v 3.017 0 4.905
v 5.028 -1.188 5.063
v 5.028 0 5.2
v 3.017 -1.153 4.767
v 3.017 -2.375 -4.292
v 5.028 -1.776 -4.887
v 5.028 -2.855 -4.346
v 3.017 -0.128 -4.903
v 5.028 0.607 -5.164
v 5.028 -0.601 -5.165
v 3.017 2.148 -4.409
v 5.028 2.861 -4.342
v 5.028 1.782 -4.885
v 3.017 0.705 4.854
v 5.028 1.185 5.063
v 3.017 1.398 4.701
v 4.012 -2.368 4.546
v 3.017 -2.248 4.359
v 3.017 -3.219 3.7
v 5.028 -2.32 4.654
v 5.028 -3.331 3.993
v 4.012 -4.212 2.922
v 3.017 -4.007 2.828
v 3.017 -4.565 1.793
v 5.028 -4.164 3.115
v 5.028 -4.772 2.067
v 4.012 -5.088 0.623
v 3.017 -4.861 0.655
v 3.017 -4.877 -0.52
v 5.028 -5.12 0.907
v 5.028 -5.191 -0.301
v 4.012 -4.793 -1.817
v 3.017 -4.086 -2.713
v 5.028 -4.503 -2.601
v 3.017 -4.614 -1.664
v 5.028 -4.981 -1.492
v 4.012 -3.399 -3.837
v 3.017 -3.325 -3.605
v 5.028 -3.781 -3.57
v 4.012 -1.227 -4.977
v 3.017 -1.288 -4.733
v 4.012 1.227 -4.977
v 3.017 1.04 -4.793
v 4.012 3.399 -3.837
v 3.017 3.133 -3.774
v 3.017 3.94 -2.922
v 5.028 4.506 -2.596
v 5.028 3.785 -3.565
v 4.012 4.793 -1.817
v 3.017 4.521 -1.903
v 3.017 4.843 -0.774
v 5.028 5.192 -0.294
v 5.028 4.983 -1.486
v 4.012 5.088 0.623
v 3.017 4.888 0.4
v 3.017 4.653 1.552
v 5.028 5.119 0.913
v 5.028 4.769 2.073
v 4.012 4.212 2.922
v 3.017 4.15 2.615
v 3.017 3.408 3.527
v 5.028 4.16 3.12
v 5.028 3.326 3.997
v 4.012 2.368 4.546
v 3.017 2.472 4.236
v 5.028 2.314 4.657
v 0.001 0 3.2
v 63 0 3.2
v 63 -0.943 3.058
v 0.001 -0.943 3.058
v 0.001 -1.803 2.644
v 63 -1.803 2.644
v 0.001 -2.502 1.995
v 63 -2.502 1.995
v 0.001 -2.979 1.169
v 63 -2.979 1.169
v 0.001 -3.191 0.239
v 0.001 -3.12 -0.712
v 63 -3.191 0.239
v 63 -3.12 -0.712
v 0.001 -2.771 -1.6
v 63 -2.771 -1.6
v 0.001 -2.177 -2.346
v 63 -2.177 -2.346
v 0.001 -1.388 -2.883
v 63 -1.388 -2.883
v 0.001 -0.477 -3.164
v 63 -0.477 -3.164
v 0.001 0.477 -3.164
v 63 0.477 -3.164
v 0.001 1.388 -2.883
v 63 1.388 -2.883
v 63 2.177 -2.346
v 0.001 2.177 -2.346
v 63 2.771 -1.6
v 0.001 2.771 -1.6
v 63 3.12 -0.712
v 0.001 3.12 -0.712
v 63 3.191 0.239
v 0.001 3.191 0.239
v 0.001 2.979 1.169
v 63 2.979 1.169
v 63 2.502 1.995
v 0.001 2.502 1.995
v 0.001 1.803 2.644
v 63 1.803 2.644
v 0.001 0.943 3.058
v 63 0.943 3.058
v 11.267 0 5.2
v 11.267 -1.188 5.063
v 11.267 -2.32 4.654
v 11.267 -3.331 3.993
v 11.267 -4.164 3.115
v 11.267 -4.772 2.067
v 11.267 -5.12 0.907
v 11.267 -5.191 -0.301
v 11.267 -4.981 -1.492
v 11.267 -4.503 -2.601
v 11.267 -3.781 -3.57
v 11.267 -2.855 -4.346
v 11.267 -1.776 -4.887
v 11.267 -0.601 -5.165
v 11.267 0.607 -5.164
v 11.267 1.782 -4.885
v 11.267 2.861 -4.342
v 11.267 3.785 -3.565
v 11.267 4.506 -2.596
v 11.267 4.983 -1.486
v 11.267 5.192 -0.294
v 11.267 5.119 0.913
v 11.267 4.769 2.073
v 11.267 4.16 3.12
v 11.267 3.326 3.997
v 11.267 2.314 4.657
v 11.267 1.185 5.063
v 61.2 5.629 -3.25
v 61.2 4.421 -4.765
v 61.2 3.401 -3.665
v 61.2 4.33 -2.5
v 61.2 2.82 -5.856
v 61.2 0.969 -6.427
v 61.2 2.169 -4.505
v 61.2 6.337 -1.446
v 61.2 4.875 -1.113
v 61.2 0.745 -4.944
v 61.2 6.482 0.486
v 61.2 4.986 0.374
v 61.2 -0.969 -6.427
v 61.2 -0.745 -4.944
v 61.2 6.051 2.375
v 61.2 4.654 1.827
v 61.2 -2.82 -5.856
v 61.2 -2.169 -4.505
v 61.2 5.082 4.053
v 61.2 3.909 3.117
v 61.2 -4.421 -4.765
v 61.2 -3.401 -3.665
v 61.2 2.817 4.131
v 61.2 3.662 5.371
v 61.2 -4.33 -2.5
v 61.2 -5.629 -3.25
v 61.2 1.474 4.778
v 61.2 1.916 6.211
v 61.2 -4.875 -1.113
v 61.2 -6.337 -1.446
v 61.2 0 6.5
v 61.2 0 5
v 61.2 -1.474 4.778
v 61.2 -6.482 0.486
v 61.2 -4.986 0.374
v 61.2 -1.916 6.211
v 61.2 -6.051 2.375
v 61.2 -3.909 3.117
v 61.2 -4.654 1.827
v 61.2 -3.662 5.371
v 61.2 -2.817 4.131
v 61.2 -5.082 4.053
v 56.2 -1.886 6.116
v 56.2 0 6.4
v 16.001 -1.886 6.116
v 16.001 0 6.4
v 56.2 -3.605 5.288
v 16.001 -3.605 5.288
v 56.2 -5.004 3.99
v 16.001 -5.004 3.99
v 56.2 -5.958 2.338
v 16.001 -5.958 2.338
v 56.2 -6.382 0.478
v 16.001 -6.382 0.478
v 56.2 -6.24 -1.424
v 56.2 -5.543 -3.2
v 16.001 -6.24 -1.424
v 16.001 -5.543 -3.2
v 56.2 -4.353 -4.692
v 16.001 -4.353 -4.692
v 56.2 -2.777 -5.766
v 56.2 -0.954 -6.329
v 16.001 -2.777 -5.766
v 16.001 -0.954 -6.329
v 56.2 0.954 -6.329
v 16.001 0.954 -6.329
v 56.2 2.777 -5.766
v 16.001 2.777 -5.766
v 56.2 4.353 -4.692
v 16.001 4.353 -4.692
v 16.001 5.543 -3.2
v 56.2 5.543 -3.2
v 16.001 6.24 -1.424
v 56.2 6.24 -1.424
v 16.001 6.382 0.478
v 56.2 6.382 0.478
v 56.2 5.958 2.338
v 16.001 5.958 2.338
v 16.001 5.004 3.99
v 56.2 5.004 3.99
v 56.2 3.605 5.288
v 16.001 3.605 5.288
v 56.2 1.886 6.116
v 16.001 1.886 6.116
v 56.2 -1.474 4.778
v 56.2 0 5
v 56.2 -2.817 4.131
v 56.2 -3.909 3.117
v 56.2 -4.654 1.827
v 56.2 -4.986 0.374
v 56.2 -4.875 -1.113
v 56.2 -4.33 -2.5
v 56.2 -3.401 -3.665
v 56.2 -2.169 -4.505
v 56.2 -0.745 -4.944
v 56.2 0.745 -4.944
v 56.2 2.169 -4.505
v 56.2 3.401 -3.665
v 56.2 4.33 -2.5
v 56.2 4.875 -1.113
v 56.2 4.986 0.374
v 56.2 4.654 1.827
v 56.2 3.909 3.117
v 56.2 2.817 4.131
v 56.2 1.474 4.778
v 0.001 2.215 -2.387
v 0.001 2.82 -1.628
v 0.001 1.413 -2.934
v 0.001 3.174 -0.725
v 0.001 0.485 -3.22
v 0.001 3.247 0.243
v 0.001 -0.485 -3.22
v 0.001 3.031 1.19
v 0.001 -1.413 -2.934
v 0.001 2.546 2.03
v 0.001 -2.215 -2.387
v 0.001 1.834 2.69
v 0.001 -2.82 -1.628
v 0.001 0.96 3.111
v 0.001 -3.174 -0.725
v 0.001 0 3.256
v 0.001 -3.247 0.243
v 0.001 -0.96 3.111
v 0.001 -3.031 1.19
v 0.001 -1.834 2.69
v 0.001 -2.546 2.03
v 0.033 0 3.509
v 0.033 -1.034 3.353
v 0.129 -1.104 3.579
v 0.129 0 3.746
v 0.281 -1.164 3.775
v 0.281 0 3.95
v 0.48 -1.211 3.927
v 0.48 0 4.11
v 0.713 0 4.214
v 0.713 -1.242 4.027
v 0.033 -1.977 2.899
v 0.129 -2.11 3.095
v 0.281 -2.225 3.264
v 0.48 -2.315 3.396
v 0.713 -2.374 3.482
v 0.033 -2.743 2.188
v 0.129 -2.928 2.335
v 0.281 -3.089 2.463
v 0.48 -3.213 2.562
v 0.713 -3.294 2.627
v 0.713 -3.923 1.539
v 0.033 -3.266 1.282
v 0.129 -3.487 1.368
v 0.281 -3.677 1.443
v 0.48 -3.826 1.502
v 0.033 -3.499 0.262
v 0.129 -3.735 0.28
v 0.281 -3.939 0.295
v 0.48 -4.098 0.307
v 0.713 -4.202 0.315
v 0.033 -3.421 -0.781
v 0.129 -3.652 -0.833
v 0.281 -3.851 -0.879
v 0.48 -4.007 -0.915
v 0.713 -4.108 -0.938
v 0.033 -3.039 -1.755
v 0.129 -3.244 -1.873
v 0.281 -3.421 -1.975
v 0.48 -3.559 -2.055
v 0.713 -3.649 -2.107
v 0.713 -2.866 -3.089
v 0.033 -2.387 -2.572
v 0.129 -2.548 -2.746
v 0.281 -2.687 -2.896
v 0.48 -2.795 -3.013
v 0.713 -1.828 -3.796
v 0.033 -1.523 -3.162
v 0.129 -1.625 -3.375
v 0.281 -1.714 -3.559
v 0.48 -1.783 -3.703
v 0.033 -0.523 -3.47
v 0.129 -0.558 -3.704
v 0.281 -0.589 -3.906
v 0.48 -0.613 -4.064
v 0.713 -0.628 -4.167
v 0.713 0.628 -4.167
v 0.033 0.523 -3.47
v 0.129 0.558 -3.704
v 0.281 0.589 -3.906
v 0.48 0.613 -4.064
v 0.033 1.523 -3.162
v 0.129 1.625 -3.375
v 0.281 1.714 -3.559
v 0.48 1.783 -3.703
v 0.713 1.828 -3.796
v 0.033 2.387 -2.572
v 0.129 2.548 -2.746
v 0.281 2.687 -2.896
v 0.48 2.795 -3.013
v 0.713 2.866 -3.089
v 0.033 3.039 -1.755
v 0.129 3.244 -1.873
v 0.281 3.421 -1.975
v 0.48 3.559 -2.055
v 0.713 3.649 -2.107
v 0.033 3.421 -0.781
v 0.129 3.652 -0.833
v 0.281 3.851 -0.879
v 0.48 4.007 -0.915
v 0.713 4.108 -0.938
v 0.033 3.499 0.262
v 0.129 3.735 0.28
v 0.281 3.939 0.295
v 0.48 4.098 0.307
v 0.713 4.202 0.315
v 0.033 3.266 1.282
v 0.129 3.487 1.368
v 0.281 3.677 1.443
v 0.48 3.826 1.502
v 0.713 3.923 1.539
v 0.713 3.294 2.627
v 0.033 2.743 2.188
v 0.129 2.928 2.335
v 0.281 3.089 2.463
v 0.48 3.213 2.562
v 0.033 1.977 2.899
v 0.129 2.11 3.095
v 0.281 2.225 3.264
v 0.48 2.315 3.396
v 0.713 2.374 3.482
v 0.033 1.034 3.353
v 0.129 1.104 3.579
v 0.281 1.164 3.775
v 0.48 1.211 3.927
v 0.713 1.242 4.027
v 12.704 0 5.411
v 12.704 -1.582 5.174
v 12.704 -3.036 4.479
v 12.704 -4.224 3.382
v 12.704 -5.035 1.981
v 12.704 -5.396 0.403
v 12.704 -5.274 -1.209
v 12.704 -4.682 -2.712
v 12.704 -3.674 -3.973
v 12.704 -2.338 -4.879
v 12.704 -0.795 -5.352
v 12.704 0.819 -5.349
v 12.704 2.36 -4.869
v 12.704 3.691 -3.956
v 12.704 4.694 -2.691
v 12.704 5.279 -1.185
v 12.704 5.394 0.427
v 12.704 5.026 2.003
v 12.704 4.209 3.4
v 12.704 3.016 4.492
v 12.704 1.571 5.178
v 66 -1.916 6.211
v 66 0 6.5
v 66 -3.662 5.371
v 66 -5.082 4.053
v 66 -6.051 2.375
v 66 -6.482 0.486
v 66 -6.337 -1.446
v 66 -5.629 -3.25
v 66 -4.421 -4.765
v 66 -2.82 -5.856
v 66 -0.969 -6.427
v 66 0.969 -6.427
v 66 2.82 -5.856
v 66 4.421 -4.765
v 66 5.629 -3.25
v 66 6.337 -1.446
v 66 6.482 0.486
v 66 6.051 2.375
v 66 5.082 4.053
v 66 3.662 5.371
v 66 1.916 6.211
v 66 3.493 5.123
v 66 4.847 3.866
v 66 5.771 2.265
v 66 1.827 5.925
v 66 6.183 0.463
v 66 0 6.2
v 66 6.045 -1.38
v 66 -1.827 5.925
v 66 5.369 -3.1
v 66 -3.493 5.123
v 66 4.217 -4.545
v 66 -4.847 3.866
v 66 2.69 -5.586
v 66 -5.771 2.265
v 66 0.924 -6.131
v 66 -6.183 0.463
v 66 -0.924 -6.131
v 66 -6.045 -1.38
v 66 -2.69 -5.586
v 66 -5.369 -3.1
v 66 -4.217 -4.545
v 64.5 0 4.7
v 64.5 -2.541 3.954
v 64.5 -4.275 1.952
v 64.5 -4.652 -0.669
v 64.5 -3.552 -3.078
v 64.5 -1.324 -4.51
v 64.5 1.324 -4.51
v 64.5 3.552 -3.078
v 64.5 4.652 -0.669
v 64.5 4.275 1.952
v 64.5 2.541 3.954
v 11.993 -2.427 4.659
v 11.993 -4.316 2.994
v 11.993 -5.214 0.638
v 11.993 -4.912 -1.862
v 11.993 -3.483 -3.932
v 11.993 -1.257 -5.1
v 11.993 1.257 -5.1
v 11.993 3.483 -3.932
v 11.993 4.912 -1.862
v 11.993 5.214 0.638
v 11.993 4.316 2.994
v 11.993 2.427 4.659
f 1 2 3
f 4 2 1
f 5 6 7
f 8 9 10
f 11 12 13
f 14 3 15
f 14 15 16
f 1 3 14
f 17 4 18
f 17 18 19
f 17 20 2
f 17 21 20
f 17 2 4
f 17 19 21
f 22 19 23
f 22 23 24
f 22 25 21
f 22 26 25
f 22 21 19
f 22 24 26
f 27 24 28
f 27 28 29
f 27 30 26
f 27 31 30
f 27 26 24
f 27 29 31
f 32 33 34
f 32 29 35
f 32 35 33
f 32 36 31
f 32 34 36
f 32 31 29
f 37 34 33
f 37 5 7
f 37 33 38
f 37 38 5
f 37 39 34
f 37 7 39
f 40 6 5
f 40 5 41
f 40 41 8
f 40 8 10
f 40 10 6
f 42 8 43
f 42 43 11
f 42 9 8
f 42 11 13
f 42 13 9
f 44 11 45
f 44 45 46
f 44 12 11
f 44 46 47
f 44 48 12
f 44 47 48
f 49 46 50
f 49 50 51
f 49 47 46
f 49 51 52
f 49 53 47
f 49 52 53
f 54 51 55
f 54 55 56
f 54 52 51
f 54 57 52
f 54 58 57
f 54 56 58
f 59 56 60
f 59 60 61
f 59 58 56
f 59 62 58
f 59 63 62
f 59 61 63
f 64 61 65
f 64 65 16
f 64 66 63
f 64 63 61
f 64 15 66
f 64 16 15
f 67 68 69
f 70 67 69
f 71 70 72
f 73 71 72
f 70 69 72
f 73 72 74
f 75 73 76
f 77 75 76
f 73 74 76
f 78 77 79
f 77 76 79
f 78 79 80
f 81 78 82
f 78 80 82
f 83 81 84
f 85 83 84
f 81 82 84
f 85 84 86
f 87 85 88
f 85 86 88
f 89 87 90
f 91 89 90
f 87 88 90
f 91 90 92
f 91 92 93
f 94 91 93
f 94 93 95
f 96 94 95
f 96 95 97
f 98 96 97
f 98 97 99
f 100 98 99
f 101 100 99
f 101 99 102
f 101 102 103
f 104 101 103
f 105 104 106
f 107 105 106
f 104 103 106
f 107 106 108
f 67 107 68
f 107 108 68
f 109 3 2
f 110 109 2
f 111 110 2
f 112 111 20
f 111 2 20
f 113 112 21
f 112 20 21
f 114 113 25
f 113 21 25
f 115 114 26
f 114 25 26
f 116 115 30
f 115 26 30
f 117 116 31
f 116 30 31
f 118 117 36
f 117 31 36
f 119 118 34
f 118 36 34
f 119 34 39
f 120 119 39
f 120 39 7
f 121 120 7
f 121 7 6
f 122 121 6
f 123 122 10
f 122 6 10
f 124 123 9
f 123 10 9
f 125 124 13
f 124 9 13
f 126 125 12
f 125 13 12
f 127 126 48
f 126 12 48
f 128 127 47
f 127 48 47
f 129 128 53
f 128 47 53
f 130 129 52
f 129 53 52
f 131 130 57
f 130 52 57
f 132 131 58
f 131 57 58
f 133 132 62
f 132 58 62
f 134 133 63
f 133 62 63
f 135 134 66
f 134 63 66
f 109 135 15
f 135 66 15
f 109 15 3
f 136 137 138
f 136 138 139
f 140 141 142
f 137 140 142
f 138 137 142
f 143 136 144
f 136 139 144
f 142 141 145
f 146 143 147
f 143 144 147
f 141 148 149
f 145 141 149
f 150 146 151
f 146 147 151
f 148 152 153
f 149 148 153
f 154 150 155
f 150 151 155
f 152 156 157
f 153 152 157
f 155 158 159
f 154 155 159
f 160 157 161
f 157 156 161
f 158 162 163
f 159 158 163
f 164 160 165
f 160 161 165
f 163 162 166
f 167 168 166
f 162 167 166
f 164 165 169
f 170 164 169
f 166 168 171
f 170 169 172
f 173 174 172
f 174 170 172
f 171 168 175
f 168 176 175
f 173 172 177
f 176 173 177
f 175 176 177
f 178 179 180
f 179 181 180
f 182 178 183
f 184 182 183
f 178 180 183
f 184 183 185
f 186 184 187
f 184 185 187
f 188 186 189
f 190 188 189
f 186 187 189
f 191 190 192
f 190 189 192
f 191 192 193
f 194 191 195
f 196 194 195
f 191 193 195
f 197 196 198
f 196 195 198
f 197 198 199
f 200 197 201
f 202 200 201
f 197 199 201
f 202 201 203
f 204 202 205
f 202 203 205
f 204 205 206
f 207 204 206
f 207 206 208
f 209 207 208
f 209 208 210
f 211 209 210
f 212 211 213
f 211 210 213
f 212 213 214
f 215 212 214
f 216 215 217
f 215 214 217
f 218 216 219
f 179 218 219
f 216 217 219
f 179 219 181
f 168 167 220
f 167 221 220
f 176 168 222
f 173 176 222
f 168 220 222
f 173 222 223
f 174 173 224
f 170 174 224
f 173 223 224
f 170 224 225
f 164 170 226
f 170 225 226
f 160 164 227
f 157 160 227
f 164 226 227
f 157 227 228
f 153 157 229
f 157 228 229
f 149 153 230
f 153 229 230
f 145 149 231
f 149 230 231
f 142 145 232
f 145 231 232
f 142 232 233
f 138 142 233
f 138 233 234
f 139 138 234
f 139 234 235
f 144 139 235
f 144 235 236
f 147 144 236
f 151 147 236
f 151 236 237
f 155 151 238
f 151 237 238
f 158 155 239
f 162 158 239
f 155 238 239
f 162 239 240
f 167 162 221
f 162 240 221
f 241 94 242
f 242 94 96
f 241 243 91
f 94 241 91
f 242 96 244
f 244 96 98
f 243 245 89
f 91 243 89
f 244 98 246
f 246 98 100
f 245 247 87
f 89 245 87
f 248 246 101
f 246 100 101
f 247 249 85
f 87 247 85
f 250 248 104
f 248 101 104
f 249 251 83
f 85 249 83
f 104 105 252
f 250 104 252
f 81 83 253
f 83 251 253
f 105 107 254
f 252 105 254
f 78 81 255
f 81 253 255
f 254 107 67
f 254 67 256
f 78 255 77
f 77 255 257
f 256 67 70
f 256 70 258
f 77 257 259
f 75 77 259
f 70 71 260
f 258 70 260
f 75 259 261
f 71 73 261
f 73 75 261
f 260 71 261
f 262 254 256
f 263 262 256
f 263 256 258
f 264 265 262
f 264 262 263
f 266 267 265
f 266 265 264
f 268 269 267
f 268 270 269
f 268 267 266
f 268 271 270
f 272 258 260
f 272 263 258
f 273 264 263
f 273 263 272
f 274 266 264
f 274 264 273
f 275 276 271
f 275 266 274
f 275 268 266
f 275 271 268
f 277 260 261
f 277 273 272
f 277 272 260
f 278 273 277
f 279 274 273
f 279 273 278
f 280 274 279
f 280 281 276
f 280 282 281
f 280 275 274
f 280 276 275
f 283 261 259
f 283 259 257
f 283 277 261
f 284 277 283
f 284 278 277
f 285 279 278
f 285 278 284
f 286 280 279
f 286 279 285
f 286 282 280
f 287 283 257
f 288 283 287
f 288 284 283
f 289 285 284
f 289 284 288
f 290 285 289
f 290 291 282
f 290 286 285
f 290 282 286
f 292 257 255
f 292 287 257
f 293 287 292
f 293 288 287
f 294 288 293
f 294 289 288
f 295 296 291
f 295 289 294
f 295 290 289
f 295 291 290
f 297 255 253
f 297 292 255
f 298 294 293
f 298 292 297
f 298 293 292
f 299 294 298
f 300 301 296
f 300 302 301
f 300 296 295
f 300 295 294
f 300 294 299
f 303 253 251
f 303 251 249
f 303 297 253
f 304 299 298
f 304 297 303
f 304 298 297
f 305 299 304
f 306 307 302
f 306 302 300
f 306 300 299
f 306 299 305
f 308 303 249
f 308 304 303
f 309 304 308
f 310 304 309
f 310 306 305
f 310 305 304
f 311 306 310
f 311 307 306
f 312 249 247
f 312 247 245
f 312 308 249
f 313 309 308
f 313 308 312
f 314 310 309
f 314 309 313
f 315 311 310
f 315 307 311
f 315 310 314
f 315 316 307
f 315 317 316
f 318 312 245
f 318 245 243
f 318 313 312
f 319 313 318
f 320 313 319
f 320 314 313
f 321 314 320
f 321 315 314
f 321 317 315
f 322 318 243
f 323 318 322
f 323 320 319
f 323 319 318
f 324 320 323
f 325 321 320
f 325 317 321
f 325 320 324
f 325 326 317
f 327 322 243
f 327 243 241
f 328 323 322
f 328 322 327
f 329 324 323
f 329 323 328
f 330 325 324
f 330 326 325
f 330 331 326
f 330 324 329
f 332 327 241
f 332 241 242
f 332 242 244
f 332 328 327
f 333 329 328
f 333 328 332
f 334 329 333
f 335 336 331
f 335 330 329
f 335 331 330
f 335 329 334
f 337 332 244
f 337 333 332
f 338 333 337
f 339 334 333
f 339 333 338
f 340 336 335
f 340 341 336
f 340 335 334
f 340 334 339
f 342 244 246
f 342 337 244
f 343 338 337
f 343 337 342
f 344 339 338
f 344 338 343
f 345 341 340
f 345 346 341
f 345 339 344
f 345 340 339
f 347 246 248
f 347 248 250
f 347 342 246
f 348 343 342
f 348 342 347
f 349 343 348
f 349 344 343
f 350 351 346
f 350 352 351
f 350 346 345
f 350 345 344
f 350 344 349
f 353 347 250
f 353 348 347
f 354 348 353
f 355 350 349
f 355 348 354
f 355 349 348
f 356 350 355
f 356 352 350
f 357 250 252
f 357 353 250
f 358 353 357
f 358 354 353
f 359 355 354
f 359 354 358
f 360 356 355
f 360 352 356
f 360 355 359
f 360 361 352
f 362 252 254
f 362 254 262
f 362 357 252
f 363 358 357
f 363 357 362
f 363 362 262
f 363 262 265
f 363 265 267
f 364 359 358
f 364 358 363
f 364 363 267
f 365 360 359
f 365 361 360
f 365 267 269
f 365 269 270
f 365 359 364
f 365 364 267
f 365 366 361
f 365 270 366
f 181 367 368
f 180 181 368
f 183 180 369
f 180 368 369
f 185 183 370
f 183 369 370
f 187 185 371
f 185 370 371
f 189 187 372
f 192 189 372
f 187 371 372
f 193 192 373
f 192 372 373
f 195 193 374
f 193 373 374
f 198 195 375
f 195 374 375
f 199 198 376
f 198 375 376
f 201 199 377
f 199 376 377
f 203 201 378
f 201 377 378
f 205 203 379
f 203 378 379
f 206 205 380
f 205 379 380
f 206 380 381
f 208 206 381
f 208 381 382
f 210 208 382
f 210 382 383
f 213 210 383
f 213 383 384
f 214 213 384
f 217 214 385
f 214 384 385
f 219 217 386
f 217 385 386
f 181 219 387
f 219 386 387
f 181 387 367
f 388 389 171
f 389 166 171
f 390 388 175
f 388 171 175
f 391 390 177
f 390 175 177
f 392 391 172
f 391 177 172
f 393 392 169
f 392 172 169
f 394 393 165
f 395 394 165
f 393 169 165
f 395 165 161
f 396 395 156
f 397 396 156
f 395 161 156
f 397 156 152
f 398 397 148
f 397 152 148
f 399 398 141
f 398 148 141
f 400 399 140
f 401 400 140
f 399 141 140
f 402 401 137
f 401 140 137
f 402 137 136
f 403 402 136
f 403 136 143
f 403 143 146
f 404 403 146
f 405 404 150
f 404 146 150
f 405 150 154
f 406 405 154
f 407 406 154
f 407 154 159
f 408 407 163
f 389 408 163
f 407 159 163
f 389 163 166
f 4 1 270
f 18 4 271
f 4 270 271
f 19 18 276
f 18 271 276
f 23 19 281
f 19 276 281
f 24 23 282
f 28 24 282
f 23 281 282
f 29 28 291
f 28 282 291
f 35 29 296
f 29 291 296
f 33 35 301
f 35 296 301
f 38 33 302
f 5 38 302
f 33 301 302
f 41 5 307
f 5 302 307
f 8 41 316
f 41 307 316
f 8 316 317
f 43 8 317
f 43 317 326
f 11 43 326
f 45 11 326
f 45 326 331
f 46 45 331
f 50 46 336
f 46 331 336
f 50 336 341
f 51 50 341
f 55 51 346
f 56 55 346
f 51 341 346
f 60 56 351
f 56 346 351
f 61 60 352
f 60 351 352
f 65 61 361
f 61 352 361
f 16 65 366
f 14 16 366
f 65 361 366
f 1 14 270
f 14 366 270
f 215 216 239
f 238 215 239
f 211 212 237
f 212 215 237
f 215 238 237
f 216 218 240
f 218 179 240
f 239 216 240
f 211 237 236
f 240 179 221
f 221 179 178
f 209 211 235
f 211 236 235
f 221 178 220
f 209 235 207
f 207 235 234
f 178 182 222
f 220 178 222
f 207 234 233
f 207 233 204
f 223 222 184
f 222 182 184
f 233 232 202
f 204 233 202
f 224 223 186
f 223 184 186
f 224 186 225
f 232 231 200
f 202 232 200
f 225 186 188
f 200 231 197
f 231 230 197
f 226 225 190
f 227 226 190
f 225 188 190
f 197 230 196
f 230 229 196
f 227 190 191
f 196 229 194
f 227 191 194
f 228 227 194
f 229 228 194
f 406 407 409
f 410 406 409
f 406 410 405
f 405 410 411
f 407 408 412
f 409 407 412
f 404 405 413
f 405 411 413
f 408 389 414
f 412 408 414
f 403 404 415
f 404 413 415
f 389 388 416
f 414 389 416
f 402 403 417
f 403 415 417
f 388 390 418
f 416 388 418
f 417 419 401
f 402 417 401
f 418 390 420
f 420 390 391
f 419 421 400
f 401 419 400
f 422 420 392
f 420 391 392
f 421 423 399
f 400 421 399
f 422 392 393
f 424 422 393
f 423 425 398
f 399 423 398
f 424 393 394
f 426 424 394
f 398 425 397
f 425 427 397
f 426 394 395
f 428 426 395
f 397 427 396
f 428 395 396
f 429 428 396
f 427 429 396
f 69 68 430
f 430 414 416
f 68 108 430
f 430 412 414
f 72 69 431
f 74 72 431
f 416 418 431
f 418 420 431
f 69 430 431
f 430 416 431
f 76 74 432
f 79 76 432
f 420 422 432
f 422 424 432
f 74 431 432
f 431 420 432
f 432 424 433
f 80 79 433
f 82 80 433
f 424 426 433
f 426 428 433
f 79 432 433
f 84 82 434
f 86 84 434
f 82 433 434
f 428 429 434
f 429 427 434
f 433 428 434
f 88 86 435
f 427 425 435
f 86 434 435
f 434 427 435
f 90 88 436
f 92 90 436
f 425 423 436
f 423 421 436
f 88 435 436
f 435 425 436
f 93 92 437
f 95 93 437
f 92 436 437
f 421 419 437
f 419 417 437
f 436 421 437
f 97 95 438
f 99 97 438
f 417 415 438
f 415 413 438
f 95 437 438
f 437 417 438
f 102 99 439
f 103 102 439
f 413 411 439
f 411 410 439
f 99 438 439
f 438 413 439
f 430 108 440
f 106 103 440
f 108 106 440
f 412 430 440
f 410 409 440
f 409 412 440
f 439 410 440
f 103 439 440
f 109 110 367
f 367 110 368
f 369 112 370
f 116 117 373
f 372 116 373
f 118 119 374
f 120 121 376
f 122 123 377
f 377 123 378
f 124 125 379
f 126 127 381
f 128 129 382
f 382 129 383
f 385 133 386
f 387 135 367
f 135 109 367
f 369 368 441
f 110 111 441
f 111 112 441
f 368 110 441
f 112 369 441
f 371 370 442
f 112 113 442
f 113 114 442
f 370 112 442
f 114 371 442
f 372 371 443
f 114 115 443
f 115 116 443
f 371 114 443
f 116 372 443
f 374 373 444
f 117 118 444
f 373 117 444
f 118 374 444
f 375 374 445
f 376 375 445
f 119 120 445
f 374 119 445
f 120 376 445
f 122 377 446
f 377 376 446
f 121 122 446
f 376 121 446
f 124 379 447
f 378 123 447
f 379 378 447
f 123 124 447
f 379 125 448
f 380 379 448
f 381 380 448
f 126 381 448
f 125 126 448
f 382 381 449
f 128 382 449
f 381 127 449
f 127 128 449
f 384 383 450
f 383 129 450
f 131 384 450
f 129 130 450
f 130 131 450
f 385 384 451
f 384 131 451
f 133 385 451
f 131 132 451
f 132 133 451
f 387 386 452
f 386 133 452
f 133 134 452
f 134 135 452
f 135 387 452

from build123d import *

# Parameters (mm, degrees)
FILETE2_R     = 7
FILETE3_R     = 5
CHANFRO1_SIZE = 3
FILETE6_R     = 1


with BuildPart() as part:
    # Esboço1 → Revolução1 (revolve)
    with BuildSketch(Plane(origin=(0, 0, 0), x_dir=(1, 0, 0), z_dir=(0, 1, 0)), mode=Mode.PRIVATE) as revolu_o1_sk:
        Polygon((0.000828852, 3.2), (66, 3.2), (66, 6.5), (61.2, 6.5), (61.2, 5), (56.2, 5), (56.2, 6.4), (16.000828852, 6.4), (12.000828852, 5.2), (4.000828852, 5.2), (0.000828852, 4), align=None)
    revolve(revolu_o1_sk.sketch.rotate(Axis((0, 0, 0), (1, 0, 0)), 180), axis=Axis((0, 0, 0), (1, 0, 0)))

    # Filete2
    filete2_edges = [part.edges().sort_by_distance(p)[0] for p in [
        (4.000828852, 0, -5.2),
    ]]
    fillet(filete2_edges, radius=FILETE2_R)

    # Filete3
    filete3_edges = [part.edges().sort_by_distance(p)[0] for p in [
        (12.000828852, 0, -5.2),
    ]]
    fillet(filete3_edges, radius=FILETE3_R)

    # Chanfro1
    chanfro1_edges = [part.edges().sort_by_distance(p)[0] for p in [
        (66, 0, -3.2),
    ]]
    chamfer(chanfro1_edges, length=CHANFRO1_SIZE)

    # Filete6
    filete6_edges = [part.edges().sort_by_distance(p)[0] for p in [
        (0.000828852, 0, -4),
    ]]
    fillet(filete6_edges, radius=FILETE6_R)


solid = part.part
